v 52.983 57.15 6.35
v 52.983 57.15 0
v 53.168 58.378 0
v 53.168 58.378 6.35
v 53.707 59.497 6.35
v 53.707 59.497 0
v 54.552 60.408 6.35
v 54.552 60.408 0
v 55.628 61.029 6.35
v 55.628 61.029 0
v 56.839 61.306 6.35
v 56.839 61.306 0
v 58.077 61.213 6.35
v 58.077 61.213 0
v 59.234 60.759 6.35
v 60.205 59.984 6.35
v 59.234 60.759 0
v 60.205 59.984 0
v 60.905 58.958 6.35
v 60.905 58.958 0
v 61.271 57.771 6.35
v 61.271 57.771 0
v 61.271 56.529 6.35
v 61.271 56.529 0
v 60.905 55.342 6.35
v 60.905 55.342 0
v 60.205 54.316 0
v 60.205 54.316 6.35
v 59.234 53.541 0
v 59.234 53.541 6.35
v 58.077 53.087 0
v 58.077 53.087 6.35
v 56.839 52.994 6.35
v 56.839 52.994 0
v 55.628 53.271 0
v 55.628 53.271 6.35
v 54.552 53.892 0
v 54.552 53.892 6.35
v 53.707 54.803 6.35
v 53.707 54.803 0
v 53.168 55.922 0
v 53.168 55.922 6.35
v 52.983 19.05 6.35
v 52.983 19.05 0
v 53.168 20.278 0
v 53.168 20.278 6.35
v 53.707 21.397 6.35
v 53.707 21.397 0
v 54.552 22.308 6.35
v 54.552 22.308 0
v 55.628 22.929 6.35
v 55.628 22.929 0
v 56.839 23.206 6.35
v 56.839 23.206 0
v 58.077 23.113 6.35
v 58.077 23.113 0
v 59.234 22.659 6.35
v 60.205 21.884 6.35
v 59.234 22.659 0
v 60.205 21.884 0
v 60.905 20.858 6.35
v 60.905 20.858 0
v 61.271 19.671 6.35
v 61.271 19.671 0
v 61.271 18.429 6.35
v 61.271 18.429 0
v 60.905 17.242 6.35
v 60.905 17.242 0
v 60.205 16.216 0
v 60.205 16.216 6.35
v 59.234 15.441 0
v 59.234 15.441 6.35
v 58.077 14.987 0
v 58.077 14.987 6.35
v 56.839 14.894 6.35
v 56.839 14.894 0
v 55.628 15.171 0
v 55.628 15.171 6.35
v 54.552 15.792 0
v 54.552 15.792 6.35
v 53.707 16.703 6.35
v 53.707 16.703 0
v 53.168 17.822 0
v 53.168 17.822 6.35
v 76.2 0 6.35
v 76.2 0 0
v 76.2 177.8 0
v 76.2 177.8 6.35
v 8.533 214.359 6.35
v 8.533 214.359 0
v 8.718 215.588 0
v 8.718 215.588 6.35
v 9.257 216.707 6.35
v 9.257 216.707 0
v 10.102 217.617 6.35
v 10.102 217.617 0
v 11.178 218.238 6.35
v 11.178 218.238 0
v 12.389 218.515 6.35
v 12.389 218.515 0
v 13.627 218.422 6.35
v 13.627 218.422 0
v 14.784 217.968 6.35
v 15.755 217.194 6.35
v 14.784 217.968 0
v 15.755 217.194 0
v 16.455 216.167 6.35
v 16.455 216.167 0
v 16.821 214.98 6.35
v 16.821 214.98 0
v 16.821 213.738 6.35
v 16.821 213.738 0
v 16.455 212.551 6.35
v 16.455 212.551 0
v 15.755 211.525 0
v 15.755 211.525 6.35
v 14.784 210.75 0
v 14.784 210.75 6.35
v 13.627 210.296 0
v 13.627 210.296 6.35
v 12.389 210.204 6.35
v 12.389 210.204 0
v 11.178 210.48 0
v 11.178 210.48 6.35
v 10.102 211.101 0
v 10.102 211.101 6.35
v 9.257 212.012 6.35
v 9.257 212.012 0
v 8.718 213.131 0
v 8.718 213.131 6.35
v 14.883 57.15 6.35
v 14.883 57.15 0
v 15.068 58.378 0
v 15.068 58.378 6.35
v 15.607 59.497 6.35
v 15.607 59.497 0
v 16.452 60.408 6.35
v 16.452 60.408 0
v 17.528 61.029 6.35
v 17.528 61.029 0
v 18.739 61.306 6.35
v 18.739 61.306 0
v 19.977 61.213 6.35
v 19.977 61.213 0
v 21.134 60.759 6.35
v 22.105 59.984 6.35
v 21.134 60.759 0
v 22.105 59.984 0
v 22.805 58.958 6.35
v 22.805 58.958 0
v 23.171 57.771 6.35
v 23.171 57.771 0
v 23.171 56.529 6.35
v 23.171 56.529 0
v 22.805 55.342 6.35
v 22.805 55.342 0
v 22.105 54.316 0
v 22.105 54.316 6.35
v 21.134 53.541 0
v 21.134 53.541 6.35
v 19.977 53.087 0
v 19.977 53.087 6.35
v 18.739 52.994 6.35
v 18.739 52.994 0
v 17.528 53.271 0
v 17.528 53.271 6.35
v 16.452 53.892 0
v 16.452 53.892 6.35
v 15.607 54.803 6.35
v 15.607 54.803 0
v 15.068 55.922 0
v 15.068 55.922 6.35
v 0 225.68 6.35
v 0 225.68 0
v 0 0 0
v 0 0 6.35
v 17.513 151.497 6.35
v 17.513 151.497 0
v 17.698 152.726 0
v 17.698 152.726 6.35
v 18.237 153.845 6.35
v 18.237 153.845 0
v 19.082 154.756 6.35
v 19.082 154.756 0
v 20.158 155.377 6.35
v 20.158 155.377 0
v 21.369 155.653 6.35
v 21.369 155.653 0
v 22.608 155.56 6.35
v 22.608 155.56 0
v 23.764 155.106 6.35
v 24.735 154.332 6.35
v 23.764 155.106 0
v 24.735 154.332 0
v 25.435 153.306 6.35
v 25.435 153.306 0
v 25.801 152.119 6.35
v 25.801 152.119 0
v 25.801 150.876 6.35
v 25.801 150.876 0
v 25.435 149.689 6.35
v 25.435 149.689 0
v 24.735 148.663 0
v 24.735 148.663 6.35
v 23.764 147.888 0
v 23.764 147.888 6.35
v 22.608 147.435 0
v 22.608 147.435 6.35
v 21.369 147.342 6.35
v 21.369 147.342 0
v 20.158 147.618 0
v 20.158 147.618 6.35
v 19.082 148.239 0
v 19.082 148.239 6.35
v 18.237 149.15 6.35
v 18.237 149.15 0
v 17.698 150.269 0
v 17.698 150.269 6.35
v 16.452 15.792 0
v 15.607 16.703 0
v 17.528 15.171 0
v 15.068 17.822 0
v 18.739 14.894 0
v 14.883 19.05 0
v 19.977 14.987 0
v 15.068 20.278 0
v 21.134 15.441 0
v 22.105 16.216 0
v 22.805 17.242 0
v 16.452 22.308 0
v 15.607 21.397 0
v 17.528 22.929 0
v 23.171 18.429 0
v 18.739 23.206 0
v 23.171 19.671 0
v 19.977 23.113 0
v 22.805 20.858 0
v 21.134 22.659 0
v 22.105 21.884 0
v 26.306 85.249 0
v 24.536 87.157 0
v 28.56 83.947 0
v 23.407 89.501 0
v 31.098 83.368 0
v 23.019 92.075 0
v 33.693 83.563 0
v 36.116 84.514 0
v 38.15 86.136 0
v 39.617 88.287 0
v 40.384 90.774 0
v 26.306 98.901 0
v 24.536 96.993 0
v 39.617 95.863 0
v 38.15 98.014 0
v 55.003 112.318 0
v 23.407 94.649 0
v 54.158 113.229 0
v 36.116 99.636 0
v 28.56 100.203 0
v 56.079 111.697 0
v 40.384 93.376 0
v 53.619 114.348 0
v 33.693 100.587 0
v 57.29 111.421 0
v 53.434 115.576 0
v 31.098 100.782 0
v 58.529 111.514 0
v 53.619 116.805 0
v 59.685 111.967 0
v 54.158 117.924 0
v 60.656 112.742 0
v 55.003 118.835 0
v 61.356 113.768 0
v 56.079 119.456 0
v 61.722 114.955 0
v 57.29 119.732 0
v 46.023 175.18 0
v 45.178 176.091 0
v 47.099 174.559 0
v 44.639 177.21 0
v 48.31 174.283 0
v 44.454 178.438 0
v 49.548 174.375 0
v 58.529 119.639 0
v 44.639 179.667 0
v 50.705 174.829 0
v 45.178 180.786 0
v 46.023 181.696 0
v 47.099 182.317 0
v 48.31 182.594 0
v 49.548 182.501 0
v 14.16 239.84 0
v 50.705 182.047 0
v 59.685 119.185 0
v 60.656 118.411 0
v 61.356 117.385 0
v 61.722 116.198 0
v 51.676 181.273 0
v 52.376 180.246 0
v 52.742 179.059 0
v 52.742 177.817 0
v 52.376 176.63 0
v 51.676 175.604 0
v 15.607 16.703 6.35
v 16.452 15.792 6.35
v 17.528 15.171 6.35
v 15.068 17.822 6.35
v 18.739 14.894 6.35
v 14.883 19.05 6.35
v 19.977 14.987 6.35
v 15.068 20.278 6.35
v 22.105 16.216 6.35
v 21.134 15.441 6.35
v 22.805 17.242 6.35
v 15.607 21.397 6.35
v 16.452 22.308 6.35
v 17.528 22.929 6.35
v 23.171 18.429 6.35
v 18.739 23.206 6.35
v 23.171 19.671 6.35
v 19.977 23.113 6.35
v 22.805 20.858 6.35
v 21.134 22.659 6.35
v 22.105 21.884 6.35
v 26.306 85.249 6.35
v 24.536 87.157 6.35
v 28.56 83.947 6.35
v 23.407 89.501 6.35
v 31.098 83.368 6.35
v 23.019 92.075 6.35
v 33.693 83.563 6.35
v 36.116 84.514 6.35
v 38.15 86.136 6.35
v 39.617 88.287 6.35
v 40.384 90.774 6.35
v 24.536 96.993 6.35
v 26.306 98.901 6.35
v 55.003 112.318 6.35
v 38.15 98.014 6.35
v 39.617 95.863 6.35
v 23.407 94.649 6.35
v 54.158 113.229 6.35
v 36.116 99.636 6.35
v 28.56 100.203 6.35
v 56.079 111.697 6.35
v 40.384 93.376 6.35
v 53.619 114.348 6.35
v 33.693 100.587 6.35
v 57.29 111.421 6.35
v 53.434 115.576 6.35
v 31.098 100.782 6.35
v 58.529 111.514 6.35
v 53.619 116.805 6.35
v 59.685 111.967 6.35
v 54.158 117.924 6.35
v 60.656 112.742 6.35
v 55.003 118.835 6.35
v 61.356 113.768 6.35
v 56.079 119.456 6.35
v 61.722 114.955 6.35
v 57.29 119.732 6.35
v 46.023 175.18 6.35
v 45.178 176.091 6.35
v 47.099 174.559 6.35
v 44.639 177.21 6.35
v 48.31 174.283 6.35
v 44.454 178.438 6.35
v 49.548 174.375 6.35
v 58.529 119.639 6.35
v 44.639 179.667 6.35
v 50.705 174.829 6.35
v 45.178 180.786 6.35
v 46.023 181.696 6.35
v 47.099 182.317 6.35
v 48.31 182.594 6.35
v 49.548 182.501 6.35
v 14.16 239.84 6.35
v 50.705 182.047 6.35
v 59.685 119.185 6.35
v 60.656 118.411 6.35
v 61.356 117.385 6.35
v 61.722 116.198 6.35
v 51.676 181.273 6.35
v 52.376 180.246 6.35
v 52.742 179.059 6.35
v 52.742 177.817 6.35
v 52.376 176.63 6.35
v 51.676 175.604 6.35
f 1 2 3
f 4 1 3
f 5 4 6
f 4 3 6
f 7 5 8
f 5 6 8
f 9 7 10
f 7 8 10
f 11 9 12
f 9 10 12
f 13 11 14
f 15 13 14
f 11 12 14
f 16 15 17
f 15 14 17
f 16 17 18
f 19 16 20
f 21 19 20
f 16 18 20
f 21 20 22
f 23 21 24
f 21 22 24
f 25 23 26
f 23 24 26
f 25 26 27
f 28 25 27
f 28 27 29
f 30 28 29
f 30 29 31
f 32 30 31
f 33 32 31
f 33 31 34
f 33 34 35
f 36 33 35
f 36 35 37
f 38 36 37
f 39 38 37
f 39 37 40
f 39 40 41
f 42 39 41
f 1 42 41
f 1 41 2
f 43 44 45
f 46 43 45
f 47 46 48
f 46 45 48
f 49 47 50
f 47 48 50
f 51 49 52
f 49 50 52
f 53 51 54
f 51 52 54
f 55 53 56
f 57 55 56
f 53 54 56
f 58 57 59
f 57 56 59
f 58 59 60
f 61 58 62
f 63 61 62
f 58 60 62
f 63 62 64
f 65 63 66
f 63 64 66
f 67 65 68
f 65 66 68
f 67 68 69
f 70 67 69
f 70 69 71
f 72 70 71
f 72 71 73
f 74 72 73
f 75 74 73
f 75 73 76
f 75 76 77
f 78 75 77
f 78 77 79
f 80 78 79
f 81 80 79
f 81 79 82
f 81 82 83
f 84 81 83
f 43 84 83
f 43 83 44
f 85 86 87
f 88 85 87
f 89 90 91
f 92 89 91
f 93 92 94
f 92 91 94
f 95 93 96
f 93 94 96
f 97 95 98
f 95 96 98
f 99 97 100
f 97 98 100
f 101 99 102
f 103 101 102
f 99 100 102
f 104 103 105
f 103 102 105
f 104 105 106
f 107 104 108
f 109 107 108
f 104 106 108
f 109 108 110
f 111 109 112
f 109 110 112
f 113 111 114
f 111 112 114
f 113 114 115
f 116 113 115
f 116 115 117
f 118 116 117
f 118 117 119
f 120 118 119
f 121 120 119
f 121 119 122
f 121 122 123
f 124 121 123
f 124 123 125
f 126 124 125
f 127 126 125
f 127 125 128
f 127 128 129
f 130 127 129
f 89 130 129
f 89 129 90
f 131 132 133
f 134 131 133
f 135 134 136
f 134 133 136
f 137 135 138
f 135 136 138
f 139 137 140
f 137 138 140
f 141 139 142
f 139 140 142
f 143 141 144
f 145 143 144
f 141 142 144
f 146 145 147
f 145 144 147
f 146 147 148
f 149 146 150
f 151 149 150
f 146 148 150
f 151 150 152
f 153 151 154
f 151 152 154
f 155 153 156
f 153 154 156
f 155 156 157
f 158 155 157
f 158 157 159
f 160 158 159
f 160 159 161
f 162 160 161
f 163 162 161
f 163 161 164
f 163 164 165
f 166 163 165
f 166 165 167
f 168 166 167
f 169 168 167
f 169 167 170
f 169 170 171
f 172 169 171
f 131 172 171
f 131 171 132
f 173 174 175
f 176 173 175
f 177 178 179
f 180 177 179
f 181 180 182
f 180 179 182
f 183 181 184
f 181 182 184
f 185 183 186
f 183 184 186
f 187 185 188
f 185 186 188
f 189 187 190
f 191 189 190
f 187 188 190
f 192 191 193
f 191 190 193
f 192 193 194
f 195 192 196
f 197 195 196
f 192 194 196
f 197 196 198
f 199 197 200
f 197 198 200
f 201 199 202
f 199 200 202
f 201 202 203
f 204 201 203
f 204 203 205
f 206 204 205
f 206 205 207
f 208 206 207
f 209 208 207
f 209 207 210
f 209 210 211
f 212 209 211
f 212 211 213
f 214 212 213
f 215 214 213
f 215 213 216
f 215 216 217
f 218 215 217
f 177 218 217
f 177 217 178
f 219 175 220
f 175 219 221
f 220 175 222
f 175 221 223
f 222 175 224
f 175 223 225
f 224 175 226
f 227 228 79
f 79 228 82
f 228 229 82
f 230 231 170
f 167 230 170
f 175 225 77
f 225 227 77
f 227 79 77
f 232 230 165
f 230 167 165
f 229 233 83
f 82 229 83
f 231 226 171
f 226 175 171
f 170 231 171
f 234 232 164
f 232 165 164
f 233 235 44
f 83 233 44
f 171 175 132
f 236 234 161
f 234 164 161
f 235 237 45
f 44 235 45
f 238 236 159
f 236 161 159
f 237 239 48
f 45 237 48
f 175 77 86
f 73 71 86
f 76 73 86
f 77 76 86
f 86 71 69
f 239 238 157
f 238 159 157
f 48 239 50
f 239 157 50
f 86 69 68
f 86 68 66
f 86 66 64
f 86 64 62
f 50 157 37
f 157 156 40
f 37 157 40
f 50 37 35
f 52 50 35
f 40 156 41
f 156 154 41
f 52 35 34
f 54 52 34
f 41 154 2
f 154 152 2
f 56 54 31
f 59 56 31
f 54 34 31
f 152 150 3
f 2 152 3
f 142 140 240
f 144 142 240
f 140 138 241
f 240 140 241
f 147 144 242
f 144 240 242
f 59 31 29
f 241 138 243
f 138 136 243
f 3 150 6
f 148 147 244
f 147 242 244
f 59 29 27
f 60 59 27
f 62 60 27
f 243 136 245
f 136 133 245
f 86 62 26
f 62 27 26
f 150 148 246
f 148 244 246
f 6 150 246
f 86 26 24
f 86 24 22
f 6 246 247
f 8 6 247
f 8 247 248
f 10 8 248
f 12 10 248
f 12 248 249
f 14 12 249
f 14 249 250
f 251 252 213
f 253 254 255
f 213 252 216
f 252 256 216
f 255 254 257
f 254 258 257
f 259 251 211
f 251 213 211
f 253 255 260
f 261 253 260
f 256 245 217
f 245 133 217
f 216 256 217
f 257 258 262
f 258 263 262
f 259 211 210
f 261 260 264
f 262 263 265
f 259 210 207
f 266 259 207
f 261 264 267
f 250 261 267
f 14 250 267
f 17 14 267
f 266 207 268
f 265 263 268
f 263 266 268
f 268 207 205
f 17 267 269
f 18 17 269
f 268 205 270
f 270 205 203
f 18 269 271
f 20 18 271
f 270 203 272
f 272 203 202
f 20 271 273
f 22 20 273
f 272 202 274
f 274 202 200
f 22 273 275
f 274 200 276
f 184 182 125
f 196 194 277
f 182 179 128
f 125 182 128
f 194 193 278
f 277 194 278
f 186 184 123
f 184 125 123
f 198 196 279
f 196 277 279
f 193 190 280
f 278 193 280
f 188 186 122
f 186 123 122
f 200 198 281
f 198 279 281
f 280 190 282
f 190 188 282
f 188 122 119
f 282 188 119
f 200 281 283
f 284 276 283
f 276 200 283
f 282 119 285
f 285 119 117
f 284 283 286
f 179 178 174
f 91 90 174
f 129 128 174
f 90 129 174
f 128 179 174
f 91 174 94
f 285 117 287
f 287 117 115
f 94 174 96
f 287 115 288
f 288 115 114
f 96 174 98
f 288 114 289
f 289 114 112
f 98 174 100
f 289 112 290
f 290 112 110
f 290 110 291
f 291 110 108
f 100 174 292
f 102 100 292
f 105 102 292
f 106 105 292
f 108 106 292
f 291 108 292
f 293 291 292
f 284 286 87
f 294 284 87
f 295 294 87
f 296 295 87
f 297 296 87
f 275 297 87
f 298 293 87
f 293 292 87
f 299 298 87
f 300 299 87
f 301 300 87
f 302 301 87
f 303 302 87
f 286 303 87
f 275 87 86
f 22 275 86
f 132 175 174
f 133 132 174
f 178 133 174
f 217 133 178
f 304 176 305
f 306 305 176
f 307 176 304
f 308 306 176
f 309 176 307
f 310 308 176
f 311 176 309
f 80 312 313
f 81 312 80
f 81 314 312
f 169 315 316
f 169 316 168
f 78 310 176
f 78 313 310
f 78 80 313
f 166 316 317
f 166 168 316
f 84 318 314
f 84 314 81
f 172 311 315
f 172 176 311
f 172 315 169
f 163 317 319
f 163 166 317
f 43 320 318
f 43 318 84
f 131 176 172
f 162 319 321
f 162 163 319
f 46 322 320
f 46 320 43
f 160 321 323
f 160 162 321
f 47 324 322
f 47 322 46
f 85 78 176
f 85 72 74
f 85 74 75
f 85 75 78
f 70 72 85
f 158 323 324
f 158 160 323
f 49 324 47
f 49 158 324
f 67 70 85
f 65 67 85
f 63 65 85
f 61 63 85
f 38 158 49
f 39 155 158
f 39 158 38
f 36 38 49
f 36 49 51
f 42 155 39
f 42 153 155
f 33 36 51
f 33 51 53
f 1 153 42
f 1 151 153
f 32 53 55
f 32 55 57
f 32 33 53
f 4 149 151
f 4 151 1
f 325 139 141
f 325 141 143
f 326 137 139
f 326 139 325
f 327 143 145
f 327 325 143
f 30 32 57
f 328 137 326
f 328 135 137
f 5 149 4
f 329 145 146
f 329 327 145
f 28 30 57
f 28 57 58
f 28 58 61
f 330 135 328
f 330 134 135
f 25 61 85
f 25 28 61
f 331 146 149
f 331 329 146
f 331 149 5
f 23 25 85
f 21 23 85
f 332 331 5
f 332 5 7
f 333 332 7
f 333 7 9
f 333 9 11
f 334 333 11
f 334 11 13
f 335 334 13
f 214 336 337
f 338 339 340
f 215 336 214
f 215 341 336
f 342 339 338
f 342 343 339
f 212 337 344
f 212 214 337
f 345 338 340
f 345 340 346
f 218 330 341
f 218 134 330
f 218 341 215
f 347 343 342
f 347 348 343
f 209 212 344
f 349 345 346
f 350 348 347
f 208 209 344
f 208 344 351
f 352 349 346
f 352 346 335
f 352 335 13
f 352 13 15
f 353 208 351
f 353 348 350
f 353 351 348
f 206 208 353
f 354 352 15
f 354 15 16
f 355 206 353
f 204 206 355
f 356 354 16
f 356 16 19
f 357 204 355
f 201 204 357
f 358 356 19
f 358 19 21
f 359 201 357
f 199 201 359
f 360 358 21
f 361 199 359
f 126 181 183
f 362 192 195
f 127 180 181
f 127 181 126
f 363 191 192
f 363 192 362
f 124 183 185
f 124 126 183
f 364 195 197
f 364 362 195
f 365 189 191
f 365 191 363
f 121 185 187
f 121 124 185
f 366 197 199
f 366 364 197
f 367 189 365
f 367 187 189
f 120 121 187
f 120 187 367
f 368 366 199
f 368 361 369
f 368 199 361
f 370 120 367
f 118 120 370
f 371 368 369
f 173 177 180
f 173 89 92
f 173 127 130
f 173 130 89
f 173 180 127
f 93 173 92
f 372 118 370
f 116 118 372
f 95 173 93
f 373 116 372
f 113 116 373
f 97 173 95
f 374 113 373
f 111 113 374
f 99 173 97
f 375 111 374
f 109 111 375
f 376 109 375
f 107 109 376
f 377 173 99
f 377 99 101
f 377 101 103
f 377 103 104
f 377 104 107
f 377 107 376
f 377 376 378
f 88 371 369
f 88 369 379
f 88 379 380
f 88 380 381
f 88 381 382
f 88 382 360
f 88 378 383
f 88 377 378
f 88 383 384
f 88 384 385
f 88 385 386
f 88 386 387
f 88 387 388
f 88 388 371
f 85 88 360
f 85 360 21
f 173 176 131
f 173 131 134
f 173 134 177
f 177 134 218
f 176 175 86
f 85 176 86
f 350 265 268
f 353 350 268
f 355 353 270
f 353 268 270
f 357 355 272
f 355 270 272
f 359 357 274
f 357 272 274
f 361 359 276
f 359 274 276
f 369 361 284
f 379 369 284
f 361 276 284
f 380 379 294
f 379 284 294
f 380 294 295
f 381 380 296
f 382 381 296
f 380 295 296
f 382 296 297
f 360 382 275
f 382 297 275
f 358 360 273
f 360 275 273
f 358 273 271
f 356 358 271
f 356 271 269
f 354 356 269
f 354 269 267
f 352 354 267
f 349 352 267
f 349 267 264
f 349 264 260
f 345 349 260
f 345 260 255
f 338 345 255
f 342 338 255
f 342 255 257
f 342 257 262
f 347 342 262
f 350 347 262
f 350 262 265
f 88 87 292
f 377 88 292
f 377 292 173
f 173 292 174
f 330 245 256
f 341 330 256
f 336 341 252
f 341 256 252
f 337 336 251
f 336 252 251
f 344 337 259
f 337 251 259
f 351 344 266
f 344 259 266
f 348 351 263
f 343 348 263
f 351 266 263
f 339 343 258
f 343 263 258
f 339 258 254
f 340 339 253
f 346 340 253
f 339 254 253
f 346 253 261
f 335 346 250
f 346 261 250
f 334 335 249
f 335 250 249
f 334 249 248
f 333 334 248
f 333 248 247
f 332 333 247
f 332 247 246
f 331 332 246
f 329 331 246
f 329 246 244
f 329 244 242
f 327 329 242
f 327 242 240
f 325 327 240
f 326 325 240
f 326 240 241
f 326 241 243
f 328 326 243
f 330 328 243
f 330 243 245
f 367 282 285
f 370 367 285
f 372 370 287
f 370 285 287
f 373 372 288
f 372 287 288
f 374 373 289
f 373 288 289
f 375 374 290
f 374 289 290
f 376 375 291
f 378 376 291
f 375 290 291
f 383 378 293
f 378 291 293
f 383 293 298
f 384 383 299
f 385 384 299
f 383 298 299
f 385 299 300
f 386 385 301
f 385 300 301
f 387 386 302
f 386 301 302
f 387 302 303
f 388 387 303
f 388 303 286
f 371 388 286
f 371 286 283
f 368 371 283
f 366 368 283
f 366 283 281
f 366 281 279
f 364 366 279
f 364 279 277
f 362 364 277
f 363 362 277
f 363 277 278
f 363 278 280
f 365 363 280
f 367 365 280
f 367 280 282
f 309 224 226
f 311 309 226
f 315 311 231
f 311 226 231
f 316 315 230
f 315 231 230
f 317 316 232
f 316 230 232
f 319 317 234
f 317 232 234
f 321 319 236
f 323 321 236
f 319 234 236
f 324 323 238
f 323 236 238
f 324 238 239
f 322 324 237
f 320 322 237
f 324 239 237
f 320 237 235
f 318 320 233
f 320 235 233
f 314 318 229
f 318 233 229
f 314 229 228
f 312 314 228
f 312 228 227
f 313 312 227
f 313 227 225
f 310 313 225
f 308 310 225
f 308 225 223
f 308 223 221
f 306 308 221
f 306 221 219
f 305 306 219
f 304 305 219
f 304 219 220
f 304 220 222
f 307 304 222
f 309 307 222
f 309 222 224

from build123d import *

# Parameters (mm, degrees)
BOSS_EXTRUDE1_DEPTH              = 6.35
F_21_64_0_32813_DIAMETER_HOLE1_D = 8.334502
LPATTERN1_COUNT                  = 2
LPATTERN1_PITCH                  = 38.1
LPATTERN1_COUNT_DIR2             = 2
LPATTERN1_PITCH_DIR2             = 38.1
F_21_64_0_32813_DIAMETER_HOLE2_D = 8.334502
LPATTERN2_COUNT                  = 3
LPATTERN2_PITCH                  = 50.8
LPATTERN2_COUNT_DIR2             = 2
LPATTERN2_PITCH_DIR2             = 38.1
F_11_16_0_6875_DIAMETER_HOLE1_D  = 17.4625


with BuildPart() as part:
    # Sketch1 → Boss-Extrude1 (new body)
    with BuildSketch(Plane.XY):
        Polygon((0, 0), (76.2, 0), (76.2, 177.8), (14.160193237, 239.839806763), (0, 225.679613527), align=None)
    extrude(amount=BOSS_EXTRUDE1_DEPTH)

    # 21/64 (0.32813) Diameter Hole1 (through all)
    with Locations(Plane.XY.offset(6.35)):
        with Locations((57.15, 19.05)):
            f_21_64_0_32813_diameter_hole1 = Hole(F_21_64_0_32813_DIAMETER_HOLE1_D / 2)

    # LPattern1: 21_64 _0.32813_ Diameter Hole1 2 × 2
    with Locations(*[(-i * LPATTERN1_PITCH, j * LPATTERN1_PITCH_DIR2, 0) for i in range(LPATTERN1_COUNT) for j in range(LPATTERN1_COUNT_DIR2) if (i, j) != (0, 0)]):
        add(f_21_64_0_32813_diameter_hole1, mode=Mode.SUBTRACT)

    # 21/64 (0.32813) Diameter Hole2 (through all)
    with Locations(Plane.XY.offset(6.35)):
        with Locations((12.7, 214.359231637)):
            f_21_64_0_32813_diameter_hole2 = Hole(F_21_64_0_32813_DIAMETER_HOLE2_D / 2)

    # LPattern2: 21_64 _0.32813_ Diameter Hole2 3 × 2, 2 skipped
    with Locations(*[Vector(0.7071067811865515, -0.7071067811865437, 0) * (i * LPATTERN2_PITCH) + Vector(-0.7071067811865441, -0.707106781186551, 0) * (j * LPATTERN2_PITCH_DIR2) for i in range(LPATTERN2_COUNT) for j in range(LPATTERN2_COUNT_DIR2) if (i, j) not in ((0, 0), (0, 1), (2, 0))]):
        add(f_21_64_0_32813_diameter_hole2, mode=Mode.SUBTRACT)

    # 11/16 (0.6875) Diameter Hole1 (through all)
    with Locations(Plane.XY.offset(6.35)):
        with Locations((31.75, 92.075)):
            Hole(F_11_16_0_6875_DIAMETER_HOLE1_D / 2)


solid = part.part
